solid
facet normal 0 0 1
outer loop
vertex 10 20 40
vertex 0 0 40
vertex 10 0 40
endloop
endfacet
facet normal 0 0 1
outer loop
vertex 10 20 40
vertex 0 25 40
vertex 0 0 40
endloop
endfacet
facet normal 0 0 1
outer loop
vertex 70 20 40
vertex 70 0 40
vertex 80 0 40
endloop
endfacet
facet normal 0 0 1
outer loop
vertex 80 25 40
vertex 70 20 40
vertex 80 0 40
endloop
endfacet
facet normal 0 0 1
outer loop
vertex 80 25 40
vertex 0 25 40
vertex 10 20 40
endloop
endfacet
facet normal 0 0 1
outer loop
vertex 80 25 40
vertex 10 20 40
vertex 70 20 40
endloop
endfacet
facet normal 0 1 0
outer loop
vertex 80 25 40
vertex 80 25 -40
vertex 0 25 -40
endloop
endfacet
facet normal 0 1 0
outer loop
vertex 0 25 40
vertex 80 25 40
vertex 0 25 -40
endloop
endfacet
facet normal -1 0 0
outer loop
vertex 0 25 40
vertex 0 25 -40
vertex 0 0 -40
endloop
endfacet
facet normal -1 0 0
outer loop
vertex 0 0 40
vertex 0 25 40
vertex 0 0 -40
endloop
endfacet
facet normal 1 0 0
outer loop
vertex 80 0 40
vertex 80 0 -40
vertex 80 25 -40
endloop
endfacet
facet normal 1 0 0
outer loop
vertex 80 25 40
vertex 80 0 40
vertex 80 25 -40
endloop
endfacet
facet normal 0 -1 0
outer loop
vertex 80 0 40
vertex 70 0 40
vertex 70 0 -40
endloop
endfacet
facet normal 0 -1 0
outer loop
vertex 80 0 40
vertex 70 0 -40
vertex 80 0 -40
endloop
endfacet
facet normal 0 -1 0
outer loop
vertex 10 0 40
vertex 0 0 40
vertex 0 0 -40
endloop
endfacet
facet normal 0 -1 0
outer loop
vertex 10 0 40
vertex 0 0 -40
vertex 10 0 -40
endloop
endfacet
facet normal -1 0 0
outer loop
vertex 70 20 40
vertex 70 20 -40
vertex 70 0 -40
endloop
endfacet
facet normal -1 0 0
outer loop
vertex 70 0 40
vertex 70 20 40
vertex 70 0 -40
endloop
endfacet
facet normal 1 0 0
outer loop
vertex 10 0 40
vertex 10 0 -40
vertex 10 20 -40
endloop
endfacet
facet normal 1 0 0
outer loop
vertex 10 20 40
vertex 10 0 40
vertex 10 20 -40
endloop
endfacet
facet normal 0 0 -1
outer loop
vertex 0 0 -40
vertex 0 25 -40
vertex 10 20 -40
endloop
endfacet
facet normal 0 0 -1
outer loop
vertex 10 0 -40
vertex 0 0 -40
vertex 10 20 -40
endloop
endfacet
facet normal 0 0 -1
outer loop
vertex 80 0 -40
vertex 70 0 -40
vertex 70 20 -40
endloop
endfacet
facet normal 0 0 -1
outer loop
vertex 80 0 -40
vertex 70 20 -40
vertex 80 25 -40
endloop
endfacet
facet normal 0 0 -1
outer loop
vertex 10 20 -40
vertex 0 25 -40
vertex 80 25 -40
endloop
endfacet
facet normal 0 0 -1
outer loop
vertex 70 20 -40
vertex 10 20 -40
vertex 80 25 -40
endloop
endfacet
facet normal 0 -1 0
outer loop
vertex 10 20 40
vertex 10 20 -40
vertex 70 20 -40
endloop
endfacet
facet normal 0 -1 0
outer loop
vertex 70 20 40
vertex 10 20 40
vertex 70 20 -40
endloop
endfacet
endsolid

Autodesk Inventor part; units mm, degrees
sketch "草圖2" plane through (0, 0, 0) normal (0, 0, 1) x (1, 0, 0)
  line L0 (0, 25) -> (0, 0)
  line L1 (0, 0) -> (10, 0)
  line L2 (10, 0) -> (10, 20)
  line L3 (10, 20) -> (70, 20)
  line L4 (70, 20) -> (70, 0)
  line L5 (70, 0) -> (80, 0)
  line L6 (80, 0) -> (80, 25)
  line L7 (80, 25) -> (0, 25)
  dimension "d11" = 10
  dimension "d12" = 5
  dimension "d14" = 80
  dimension "d17" = 20
extrude "擠出2" add sketch "草圖2" along normal mid plane 80
ref_plane "工作平面1" through (80, 0, 40) normal (0.0872, 0, 0.9962) x (0, 1, 0)
ref_plane "工作平面2" through (80, 0, 40) normal (0.9962, 0, -0.0872) x (0, 1, 0)
ref_plane "工作平面3" through (40, 0, 40) normal (-1, 0, 0) x (0, 0, 1)
equation "\"d11\" = leg_length"
equation "\"d12\" = thickness"
equation "\"d14\" = width"
equation "\"d17\" = height"
equation "\"d15\" = length"
equation "\"width\" = 80 * ratio"
equation "\"height\" = 20 * ratio"
equation "\"length\" = width"
equation "\"leg_length\" = ratio"
equation "\"thickness\" = 5 * ratio"
equation "\"ratio\" = 1"
properties part number "bridge_rect_final"
